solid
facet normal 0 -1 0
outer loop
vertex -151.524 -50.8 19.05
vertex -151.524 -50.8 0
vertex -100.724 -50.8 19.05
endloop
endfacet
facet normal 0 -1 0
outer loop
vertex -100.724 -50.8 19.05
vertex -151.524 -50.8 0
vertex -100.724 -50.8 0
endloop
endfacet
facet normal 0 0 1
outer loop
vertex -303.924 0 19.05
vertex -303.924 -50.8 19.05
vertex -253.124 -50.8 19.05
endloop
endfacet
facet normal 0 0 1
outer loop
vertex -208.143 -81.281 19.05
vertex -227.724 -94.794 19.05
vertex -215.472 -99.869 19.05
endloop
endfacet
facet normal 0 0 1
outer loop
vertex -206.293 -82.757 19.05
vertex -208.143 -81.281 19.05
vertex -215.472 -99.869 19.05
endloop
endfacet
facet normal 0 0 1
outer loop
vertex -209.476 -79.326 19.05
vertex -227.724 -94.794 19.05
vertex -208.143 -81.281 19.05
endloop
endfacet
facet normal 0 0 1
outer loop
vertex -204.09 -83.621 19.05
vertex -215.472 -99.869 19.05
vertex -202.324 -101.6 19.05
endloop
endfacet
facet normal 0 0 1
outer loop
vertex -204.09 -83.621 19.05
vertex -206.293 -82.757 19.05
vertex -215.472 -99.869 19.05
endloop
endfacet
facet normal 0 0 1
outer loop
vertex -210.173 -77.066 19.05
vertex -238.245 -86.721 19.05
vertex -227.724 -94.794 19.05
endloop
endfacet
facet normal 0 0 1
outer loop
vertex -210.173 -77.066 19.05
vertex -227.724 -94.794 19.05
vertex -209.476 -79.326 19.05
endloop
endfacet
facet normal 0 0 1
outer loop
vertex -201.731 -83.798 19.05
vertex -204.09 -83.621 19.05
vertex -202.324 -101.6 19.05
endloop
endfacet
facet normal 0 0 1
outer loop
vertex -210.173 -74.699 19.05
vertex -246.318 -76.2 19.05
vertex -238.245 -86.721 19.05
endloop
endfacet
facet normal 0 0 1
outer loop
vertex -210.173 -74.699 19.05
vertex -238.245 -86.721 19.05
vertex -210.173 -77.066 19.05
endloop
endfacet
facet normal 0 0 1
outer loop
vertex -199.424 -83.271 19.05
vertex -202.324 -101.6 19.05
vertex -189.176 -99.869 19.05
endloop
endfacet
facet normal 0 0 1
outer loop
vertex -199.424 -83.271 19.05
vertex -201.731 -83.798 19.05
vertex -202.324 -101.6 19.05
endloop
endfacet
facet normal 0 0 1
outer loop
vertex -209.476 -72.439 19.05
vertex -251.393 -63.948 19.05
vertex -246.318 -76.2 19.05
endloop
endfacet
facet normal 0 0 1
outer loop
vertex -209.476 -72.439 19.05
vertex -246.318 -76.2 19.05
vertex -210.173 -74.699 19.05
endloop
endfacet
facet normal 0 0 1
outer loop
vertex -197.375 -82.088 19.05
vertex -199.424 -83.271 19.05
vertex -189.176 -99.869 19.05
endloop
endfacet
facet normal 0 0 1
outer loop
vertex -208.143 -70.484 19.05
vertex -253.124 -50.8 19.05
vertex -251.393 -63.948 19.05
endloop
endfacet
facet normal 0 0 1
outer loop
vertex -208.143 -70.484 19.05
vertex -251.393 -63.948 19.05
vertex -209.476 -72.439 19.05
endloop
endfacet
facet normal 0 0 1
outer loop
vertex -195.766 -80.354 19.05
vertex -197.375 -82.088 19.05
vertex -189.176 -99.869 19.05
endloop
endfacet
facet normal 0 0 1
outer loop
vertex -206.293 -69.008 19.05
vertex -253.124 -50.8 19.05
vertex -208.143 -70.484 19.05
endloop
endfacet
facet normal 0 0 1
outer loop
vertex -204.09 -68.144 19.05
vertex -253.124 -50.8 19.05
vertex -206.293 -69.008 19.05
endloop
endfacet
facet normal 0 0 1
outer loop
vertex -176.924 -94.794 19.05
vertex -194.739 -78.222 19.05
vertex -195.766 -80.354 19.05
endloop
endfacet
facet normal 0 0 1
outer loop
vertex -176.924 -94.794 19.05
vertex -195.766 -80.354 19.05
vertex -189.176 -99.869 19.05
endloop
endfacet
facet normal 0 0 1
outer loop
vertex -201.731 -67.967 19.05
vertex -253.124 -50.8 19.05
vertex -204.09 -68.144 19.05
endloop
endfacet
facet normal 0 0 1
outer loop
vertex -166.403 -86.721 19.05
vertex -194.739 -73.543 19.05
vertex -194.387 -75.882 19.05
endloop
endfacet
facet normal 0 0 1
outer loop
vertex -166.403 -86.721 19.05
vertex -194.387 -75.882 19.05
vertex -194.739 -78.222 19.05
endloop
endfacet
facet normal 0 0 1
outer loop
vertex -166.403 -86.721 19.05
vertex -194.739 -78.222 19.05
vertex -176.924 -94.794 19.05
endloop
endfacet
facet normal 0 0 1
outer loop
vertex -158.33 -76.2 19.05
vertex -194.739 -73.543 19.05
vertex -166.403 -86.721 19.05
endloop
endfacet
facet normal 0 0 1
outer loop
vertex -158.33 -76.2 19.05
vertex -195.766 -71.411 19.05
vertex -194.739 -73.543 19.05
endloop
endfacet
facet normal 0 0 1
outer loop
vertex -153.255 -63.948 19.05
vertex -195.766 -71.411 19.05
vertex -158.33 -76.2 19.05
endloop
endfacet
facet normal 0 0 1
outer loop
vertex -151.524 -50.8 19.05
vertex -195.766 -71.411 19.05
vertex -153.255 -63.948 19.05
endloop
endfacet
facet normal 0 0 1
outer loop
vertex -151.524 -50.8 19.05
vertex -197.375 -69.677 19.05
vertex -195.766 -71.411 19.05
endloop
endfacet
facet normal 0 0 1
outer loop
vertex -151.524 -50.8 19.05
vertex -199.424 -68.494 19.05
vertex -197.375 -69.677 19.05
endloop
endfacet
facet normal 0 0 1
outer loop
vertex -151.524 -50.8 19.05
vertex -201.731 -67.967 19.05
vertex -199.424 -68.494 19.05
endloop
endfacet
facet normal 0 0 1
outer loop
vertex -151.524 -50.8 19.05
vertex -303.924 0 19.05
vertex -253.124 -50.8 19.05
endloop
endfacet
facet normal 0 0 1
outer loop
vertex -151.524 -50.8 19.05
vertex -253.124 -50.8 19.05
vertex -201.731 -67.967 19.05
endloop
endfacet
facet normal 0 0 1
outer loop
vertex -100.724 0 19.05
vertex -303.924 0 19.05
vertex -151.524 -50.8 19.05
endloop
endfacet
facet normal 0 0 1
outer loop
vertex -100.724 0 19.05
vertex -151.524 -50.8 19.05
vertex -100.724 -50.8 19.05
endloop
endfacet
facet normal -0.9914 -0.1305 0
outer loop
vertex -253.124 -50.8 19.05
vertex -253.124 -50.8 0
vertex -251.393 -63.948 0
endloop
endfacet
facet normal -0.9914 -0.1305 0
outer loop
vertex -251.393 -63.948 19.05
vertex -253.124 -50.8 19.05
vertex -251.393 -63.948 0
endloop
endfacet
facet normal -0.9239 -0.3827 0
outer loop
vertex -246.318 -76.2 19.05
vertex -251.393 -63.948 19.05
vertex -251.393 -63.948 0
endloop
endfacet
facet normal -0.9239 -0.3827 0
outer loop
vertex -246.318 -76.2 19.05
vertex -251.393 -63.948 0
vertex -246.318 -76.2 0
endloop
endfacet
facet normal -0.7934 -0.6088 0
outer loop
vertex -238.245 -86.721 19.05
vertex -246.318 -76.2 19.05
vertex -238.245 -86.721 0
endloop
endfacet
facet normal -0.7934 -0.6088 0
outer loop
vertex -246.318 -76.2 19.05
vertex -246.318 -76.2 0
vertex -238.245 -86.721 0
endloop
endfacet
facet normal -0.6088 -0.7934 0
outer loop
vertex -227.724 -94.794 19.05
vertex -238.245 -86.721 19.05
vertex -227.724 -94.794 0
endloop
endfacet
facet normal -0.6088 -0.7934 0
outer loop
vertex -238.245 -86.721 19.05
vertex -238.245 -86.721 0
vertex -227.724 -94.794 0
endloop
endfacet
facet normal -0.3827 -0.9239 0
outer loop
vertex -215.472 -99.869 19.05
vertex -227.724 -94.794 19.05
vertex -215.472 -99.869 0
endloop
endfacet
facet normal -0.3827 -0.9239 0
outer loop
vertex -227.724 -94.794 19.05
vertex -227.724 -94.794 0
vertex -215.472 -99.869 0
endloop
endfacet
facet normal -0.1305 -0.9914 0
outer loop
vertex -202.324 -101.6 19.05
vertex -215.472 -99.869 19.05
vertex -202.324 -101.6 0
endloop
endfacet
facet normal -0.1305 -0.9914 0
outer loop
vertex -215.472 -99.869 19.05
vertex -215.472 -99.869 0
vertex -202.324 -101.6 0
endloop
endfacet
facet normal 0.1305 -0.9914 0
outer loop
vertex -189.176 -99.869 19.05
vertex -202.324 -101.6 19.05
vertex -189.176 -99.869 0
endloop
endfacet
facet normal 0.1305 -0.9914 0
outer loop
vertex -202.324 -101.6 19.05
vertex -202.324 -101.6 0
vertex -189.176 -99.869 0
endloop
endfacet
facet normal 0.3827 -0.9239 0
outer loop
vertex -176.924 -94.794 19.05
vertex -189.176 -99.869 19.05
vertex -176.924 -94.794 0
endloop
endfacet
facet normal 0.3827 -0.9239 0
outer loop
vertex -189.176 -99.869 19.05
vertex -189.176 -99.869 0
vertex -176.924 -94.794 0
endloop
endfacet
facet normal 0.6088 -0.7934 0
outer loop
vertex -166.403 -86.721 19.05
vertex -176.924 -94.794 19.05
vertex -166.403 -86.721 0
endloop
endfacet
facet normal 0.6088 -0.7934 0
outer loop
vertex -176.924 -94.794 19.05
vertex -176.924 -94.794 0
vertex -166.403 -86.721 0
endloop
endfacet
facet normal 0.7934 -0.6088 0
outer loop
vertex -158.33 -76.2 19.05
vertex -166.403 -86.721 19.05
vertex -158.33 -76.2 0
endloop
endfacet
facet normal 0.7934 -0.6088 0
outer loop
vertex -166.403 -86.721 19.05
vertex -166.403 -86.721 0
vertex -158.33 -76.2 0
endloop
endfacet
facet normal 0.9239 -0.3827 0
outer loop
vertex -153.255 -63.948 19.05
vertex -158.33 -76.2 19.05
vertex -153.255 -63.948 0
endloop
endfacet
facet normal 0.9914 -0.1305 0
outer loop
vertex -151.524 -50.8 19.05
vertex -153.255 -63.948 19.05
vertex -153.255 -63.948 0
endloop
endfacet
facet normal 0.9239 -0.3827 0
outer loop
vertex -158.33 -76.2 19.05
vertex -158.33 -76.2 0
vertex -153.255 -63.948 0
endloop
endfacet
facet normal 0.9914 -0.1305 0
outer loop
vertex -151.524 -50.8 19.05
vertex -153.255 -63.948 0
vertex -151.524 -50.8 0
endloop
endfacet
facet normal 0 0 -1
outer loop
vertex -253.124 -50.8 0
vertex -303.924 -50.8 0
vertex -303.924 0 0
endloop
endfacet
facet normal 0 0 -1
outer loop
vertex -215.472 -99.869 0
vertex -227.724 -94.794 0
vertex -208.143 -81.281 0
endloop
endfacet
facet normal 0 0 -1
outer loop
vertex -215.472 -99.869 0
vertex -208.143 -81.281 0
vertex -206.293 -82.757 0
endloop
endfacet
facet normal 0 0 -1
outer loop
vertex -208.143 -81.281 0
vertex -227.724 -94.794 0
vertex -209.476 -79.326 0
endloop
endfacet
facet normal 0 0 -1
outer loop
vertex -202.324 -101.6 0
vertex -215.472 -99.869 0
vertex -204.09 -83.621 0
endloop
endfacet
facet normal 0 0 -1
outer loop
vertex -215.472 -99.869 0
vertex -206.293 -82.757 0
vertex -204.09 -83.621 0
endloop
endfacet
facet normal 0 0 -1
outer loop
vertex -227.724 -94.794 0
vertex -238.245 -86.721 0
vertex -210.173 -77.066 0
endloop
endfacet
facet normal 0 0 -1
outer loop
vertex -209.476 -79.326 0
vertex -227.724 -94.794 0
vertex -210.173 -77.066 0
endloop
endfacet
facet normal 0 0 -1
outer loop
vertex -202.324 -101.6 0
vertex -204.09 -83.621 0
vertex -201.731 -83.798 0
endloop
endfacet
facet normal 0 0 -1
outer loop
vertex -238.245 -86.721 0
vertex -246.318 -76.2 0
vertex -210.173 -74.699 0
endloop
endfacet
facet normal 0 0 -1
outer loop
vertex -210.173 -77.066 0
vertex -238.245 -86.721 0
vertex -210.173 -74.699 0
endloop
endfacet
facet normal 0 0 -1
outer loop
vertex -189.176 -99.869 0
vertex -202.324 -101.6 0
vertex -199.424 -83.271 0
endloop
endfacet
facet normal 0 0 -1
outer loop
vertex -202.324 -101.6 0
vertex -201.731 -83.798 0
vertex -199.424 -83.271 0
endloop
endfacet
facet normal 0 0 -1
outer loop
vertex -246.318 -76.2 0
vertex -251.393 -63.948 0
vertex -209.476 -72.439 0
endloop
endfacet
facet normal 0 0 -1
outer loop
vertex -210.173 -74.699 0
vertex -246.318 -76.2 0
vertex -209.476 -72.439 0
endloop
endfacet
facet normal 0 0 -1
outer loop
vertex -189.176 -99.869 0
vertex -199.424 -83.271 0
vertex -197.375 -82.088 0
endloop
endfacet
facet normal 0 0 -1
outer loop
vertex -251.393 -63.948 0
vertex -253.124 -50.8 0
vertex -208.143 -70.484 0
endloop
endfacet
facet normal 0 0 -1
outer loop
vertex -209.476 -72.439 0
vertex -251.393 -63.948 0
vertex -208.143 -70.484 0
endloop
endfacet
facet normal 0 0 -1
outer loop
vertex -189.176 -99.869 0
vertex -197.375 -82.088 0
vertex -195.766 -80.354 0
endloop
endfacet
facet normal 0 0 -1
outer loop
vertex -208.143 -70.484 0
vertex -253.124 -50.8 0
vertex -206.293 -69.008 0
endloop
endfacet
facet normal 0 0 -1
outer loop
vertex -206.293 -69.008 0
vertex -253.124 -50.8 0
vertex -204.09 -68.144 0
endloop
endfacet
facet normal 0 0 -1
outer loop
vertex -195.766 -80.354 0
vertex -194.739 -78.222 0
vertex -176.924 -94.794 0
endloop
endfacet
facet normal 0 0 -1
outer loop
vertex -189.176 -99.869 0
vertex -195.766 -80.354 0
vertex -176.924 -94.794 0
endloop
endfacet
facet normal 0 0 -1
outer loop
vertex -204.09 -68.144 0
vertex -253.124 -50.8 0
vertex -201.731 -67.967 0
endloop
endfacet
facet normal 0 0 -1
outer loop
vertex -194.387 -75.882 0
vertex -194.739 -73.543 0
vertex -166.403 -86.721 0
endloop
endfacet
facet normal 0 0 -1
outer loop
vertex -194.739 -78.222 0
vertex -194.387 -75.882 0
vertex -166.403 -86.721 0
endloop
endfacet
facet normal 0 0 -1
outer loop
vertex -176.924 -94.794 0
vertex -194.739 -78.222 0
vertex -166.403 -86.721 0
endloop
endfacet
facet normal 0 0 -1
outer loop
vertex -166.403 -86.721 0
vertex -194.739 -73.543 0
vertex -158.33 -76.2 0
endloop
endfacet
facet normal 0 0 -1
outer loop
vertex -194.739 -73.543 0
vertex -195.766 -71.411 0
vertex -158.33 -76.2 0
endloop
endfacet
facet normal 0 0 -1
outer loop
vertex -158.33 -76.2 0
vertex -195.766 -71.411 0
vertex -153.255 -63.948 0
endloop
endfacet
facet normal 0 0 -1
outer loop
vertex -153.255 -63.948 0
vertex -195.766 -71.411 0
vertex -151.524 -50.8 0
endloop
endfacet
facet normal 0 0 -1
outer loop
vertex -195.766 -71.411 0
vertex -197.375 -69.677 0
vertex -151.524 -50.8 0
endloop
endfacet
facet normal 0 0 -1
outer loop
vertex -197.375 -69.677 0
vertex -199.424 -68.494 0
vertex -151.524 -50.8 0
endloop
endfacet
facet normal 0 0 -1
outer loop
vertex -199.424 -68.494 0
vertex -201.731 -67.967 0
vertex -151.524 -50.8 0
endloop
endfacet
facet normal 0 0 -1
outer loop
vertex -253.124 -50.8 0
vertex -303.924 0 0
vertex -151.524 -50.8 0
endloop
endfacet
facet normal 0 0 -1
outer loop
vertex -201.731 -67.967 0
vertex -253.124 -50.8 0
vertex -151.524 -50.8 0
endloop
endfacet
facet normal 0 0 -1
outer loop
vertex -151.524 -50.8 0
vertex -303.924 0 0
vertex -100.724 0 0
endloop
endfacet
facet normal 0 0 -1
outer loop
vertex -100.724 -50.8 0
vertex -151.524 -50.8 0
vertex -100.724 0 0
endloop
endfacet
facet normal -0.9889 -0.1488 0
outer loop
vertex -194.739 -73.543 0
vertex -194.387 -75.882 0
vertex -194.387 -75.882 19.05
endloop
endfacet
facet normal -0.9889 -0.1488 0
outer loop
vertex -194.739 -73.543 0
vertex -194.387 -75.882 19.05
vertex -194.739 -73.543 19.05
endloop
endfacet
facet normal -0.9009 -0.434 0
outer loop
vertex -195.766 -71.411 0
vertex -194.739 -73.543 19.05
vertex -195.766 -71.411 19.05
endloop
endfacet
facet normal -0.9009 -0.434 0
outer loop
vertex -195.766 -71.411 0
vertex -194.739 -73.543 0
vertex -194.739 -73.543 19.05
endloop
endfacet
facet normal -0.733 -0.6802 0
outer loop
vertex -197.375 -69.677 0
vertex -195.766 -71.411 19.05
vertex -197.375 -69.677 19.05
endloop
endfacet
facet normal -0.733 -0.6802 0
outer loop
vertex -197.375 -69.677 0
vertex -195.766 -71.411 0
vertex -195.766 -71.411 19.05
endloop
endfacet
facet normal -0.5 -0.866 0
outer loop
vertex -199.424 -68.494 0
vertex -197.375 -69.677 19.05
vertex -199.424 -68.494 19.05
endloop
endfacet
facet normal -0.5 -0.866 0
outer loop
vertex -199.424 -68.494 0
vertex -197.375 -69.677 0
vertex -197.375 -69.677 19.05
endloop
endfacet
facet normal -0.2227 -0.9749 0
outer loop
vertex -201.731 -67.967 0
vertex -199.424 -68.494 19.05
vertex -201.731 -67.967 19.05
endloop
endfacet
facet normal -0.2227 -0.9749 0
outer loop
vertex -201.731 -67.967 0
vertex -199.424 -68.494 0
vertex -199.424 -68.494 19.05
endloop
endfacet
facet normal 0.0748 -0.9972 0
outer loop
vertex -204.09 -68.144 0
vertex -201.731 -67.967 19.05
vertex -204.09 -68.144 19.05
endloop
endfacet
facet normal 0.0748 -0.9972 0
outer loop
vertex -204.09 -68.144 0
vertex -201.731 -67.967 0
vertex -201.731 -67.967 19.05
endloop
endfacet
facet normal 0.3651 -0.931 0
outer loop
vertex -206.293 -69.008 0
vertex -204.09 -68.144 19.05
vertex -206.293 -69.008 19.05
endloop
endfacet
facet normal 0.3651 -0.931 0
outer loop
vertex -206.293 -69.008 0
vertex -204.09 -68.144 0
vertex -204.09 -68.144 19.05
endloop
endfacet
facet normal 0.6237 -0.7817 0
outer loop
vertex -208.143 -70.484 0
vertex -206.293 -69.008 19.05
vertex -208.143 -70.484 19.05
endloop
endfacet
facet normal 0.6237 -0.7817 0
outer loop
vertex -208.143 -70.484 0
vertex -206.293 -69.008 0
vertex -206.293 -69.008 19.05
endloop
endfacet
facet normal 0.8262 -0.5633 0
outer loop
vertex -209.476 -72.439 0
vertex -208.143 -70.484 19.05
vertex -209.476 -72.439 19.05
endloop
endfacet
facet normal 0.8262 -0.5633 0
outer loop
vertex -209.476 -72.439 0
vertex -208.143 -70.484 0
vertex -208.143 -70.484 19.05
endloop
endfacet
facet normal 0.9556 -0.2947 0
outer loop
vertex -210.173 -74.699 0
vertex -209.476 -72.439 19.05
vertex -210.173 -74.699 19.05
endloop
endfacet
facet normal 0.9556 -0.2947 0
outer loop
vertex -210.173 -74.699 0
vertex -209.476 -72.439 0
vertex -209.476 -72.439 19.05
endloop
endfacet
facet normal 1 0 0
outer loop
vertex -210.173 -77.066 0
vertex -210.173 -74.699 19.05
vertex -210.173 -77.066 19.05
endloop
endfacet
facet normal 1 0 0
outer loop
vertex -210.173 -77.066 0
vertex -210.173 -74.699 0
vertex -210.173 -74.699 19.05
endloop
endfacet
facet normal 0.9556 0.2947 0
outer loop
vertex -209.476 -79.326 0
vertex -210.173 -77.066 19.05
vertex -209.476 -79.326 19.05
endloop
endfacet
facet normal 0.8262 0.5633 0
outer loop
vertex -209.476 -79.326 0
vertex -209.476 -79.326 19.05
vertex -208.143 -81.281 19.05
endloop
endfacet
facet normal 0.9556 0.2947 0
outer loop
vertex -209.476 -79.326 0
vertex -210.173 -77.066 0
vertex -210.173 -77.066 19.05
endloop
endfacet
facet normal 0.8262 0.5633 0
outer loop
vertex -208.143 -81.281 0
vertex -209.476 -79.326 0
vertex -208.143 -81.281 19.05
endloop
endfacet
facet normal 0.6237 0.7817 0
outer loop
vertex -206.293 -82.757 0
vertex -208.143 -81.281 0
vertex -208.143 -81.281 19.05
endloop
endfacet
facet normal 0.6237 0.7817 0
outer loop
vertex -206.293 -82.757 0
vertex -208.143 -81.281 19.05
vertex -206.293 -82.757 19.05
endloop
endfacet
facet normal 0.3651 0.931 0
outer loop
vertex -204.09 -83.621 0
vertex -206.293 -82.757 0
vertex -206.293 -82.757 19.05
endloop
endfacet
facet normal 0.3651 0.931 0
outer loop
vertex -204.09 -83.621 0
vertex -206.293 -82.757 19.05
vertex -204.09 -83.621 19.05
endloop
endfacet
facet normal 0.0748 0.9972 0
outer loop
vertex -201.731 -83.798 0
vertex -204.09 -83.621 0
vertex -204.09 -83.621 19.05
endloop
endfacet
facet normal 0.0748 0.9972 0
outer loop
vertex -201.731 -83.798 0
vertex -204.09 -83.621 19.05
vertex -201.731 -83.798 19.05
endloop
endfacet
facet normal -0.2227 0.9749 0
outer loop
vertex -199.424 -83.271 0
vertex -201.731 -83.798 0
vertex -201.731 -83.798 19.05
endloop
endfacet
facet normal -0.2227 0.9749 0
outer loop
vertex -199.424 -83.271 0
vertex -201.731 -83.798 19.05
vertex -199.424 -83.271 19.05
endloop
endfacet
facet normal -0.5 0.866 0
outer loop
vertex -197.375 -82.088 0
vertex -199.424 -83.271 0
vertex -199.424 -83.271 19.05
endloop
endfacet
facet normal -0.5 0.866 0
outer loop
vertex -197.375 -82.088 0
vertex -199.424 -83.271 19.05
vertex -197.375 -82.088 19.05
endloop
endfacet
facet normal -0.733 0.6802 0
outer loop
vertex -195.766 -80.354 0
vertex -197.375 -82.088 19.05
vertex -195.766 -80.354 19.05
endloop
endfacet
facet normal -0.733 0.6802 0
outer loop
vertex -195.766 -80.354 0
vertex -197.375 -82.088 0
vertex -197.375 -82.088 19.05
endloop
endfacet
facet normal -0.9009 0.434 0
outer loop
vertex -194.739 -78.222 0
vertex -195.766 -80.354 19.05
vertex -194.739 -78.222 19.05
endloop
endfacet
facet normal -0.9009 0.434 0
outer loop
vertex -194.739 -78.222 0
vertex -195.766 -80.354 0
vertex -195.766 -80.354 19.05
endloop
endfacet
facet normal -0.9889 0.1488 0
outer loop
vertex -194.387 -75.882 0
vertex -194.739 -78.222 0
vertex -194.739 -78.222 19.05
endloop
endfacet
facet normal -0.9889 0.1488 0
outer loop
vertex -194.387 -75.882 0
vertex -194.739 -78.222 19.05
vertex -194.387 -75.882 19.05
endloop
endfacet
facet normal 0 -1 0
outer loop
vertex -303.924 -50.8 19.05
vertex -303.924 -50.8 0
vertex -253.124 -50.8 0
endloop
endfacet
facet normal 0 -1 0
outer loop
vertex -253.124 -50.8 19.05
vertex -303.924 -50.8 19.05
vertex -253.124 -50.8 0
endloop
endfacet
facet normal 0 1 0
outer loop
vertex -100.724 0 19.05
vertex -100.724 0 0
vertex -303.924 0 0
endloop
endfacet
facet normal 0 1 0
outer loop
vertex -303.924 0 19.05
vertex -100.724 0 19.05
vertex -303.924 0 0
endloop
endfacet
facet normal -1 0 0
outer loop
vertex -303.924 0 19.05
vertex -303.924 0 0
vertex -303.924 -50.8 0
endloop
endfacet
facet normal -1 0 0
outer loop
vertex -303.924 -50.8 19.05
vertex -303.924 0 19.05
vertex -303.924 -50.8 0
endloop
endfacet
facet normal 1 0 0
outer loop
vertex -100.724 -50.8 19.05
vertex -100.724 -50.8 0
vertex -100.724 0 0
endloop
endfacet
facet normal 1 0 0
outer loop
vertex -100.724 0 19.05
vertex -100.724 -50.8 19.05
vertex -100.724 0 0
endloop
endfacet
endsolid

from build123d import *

# Parameters (mm, degrees)
F0_R     = 7.9375
F1_DEPTH = 19.05


# Not quite as in the source:
# - a feature of the source that left no trace in its solid (it failed there, or was rolled back) is left out


with BuildPart() as f1:
    # F0 (on Top) → F1 (new body)
    with BuildSketch(Plane.XY):
        with BuildLine():
            ThreePointArc((-253.1241280528, -50.8), (-238.245152537, -14.8789755157), (-202.3241280528, 0))
            Line((-202.3241280528, 0), (-303.9241280528, 0))
            Line((-303.9241280528, 0), (-303.9241280528, -50.8))
            Line((-303.9241280528, -50.8), (-253.1241280528, -50.8))
        make_face()
        with BuildLine():
            ThreePointArc((-151.5241280528, -50.8), (-166.4031035685, -14.8789755157), (-202.3241280528, 0))
            ThreePointArc((-202.3241280528, 0), (-238.245152537, -14.8789755157), (-253.1241280528, -50.8))
            Line((-253.1241280528, -50.8), (-151.5241280528, -50.8))
        make_face()
        with BuildLine():
            Line((-100.7241280528, -50.8), (-100.7241280528, 0))
            Line((-100.7241280528, 0), (-202.3241280528, 0))
            ThreePointArc((-202.3241280528, 0), (-166.4031035685, -14.8789755157), (-151.5241280528, -50.8))
            Line((-151.5241280528, -50.8), (-100.7241280528, -50.8))
        make_face()
        with BuildLine():
            ThreePointArc((-253.1241280528, -50.8), (-202.3241280528, -101.6), (-151.5241280528, -50.8))
            Line((-151.5241280528, -50.8), (-253.1241280528, -50.8))
        make_face()
        with Locations((-202.3241280528, -75.8825)):
            Circle(F0_R, mode=Mode.SUBTRACT)
    extrude(amount=F1_DEPTH)


solid = f1.part
